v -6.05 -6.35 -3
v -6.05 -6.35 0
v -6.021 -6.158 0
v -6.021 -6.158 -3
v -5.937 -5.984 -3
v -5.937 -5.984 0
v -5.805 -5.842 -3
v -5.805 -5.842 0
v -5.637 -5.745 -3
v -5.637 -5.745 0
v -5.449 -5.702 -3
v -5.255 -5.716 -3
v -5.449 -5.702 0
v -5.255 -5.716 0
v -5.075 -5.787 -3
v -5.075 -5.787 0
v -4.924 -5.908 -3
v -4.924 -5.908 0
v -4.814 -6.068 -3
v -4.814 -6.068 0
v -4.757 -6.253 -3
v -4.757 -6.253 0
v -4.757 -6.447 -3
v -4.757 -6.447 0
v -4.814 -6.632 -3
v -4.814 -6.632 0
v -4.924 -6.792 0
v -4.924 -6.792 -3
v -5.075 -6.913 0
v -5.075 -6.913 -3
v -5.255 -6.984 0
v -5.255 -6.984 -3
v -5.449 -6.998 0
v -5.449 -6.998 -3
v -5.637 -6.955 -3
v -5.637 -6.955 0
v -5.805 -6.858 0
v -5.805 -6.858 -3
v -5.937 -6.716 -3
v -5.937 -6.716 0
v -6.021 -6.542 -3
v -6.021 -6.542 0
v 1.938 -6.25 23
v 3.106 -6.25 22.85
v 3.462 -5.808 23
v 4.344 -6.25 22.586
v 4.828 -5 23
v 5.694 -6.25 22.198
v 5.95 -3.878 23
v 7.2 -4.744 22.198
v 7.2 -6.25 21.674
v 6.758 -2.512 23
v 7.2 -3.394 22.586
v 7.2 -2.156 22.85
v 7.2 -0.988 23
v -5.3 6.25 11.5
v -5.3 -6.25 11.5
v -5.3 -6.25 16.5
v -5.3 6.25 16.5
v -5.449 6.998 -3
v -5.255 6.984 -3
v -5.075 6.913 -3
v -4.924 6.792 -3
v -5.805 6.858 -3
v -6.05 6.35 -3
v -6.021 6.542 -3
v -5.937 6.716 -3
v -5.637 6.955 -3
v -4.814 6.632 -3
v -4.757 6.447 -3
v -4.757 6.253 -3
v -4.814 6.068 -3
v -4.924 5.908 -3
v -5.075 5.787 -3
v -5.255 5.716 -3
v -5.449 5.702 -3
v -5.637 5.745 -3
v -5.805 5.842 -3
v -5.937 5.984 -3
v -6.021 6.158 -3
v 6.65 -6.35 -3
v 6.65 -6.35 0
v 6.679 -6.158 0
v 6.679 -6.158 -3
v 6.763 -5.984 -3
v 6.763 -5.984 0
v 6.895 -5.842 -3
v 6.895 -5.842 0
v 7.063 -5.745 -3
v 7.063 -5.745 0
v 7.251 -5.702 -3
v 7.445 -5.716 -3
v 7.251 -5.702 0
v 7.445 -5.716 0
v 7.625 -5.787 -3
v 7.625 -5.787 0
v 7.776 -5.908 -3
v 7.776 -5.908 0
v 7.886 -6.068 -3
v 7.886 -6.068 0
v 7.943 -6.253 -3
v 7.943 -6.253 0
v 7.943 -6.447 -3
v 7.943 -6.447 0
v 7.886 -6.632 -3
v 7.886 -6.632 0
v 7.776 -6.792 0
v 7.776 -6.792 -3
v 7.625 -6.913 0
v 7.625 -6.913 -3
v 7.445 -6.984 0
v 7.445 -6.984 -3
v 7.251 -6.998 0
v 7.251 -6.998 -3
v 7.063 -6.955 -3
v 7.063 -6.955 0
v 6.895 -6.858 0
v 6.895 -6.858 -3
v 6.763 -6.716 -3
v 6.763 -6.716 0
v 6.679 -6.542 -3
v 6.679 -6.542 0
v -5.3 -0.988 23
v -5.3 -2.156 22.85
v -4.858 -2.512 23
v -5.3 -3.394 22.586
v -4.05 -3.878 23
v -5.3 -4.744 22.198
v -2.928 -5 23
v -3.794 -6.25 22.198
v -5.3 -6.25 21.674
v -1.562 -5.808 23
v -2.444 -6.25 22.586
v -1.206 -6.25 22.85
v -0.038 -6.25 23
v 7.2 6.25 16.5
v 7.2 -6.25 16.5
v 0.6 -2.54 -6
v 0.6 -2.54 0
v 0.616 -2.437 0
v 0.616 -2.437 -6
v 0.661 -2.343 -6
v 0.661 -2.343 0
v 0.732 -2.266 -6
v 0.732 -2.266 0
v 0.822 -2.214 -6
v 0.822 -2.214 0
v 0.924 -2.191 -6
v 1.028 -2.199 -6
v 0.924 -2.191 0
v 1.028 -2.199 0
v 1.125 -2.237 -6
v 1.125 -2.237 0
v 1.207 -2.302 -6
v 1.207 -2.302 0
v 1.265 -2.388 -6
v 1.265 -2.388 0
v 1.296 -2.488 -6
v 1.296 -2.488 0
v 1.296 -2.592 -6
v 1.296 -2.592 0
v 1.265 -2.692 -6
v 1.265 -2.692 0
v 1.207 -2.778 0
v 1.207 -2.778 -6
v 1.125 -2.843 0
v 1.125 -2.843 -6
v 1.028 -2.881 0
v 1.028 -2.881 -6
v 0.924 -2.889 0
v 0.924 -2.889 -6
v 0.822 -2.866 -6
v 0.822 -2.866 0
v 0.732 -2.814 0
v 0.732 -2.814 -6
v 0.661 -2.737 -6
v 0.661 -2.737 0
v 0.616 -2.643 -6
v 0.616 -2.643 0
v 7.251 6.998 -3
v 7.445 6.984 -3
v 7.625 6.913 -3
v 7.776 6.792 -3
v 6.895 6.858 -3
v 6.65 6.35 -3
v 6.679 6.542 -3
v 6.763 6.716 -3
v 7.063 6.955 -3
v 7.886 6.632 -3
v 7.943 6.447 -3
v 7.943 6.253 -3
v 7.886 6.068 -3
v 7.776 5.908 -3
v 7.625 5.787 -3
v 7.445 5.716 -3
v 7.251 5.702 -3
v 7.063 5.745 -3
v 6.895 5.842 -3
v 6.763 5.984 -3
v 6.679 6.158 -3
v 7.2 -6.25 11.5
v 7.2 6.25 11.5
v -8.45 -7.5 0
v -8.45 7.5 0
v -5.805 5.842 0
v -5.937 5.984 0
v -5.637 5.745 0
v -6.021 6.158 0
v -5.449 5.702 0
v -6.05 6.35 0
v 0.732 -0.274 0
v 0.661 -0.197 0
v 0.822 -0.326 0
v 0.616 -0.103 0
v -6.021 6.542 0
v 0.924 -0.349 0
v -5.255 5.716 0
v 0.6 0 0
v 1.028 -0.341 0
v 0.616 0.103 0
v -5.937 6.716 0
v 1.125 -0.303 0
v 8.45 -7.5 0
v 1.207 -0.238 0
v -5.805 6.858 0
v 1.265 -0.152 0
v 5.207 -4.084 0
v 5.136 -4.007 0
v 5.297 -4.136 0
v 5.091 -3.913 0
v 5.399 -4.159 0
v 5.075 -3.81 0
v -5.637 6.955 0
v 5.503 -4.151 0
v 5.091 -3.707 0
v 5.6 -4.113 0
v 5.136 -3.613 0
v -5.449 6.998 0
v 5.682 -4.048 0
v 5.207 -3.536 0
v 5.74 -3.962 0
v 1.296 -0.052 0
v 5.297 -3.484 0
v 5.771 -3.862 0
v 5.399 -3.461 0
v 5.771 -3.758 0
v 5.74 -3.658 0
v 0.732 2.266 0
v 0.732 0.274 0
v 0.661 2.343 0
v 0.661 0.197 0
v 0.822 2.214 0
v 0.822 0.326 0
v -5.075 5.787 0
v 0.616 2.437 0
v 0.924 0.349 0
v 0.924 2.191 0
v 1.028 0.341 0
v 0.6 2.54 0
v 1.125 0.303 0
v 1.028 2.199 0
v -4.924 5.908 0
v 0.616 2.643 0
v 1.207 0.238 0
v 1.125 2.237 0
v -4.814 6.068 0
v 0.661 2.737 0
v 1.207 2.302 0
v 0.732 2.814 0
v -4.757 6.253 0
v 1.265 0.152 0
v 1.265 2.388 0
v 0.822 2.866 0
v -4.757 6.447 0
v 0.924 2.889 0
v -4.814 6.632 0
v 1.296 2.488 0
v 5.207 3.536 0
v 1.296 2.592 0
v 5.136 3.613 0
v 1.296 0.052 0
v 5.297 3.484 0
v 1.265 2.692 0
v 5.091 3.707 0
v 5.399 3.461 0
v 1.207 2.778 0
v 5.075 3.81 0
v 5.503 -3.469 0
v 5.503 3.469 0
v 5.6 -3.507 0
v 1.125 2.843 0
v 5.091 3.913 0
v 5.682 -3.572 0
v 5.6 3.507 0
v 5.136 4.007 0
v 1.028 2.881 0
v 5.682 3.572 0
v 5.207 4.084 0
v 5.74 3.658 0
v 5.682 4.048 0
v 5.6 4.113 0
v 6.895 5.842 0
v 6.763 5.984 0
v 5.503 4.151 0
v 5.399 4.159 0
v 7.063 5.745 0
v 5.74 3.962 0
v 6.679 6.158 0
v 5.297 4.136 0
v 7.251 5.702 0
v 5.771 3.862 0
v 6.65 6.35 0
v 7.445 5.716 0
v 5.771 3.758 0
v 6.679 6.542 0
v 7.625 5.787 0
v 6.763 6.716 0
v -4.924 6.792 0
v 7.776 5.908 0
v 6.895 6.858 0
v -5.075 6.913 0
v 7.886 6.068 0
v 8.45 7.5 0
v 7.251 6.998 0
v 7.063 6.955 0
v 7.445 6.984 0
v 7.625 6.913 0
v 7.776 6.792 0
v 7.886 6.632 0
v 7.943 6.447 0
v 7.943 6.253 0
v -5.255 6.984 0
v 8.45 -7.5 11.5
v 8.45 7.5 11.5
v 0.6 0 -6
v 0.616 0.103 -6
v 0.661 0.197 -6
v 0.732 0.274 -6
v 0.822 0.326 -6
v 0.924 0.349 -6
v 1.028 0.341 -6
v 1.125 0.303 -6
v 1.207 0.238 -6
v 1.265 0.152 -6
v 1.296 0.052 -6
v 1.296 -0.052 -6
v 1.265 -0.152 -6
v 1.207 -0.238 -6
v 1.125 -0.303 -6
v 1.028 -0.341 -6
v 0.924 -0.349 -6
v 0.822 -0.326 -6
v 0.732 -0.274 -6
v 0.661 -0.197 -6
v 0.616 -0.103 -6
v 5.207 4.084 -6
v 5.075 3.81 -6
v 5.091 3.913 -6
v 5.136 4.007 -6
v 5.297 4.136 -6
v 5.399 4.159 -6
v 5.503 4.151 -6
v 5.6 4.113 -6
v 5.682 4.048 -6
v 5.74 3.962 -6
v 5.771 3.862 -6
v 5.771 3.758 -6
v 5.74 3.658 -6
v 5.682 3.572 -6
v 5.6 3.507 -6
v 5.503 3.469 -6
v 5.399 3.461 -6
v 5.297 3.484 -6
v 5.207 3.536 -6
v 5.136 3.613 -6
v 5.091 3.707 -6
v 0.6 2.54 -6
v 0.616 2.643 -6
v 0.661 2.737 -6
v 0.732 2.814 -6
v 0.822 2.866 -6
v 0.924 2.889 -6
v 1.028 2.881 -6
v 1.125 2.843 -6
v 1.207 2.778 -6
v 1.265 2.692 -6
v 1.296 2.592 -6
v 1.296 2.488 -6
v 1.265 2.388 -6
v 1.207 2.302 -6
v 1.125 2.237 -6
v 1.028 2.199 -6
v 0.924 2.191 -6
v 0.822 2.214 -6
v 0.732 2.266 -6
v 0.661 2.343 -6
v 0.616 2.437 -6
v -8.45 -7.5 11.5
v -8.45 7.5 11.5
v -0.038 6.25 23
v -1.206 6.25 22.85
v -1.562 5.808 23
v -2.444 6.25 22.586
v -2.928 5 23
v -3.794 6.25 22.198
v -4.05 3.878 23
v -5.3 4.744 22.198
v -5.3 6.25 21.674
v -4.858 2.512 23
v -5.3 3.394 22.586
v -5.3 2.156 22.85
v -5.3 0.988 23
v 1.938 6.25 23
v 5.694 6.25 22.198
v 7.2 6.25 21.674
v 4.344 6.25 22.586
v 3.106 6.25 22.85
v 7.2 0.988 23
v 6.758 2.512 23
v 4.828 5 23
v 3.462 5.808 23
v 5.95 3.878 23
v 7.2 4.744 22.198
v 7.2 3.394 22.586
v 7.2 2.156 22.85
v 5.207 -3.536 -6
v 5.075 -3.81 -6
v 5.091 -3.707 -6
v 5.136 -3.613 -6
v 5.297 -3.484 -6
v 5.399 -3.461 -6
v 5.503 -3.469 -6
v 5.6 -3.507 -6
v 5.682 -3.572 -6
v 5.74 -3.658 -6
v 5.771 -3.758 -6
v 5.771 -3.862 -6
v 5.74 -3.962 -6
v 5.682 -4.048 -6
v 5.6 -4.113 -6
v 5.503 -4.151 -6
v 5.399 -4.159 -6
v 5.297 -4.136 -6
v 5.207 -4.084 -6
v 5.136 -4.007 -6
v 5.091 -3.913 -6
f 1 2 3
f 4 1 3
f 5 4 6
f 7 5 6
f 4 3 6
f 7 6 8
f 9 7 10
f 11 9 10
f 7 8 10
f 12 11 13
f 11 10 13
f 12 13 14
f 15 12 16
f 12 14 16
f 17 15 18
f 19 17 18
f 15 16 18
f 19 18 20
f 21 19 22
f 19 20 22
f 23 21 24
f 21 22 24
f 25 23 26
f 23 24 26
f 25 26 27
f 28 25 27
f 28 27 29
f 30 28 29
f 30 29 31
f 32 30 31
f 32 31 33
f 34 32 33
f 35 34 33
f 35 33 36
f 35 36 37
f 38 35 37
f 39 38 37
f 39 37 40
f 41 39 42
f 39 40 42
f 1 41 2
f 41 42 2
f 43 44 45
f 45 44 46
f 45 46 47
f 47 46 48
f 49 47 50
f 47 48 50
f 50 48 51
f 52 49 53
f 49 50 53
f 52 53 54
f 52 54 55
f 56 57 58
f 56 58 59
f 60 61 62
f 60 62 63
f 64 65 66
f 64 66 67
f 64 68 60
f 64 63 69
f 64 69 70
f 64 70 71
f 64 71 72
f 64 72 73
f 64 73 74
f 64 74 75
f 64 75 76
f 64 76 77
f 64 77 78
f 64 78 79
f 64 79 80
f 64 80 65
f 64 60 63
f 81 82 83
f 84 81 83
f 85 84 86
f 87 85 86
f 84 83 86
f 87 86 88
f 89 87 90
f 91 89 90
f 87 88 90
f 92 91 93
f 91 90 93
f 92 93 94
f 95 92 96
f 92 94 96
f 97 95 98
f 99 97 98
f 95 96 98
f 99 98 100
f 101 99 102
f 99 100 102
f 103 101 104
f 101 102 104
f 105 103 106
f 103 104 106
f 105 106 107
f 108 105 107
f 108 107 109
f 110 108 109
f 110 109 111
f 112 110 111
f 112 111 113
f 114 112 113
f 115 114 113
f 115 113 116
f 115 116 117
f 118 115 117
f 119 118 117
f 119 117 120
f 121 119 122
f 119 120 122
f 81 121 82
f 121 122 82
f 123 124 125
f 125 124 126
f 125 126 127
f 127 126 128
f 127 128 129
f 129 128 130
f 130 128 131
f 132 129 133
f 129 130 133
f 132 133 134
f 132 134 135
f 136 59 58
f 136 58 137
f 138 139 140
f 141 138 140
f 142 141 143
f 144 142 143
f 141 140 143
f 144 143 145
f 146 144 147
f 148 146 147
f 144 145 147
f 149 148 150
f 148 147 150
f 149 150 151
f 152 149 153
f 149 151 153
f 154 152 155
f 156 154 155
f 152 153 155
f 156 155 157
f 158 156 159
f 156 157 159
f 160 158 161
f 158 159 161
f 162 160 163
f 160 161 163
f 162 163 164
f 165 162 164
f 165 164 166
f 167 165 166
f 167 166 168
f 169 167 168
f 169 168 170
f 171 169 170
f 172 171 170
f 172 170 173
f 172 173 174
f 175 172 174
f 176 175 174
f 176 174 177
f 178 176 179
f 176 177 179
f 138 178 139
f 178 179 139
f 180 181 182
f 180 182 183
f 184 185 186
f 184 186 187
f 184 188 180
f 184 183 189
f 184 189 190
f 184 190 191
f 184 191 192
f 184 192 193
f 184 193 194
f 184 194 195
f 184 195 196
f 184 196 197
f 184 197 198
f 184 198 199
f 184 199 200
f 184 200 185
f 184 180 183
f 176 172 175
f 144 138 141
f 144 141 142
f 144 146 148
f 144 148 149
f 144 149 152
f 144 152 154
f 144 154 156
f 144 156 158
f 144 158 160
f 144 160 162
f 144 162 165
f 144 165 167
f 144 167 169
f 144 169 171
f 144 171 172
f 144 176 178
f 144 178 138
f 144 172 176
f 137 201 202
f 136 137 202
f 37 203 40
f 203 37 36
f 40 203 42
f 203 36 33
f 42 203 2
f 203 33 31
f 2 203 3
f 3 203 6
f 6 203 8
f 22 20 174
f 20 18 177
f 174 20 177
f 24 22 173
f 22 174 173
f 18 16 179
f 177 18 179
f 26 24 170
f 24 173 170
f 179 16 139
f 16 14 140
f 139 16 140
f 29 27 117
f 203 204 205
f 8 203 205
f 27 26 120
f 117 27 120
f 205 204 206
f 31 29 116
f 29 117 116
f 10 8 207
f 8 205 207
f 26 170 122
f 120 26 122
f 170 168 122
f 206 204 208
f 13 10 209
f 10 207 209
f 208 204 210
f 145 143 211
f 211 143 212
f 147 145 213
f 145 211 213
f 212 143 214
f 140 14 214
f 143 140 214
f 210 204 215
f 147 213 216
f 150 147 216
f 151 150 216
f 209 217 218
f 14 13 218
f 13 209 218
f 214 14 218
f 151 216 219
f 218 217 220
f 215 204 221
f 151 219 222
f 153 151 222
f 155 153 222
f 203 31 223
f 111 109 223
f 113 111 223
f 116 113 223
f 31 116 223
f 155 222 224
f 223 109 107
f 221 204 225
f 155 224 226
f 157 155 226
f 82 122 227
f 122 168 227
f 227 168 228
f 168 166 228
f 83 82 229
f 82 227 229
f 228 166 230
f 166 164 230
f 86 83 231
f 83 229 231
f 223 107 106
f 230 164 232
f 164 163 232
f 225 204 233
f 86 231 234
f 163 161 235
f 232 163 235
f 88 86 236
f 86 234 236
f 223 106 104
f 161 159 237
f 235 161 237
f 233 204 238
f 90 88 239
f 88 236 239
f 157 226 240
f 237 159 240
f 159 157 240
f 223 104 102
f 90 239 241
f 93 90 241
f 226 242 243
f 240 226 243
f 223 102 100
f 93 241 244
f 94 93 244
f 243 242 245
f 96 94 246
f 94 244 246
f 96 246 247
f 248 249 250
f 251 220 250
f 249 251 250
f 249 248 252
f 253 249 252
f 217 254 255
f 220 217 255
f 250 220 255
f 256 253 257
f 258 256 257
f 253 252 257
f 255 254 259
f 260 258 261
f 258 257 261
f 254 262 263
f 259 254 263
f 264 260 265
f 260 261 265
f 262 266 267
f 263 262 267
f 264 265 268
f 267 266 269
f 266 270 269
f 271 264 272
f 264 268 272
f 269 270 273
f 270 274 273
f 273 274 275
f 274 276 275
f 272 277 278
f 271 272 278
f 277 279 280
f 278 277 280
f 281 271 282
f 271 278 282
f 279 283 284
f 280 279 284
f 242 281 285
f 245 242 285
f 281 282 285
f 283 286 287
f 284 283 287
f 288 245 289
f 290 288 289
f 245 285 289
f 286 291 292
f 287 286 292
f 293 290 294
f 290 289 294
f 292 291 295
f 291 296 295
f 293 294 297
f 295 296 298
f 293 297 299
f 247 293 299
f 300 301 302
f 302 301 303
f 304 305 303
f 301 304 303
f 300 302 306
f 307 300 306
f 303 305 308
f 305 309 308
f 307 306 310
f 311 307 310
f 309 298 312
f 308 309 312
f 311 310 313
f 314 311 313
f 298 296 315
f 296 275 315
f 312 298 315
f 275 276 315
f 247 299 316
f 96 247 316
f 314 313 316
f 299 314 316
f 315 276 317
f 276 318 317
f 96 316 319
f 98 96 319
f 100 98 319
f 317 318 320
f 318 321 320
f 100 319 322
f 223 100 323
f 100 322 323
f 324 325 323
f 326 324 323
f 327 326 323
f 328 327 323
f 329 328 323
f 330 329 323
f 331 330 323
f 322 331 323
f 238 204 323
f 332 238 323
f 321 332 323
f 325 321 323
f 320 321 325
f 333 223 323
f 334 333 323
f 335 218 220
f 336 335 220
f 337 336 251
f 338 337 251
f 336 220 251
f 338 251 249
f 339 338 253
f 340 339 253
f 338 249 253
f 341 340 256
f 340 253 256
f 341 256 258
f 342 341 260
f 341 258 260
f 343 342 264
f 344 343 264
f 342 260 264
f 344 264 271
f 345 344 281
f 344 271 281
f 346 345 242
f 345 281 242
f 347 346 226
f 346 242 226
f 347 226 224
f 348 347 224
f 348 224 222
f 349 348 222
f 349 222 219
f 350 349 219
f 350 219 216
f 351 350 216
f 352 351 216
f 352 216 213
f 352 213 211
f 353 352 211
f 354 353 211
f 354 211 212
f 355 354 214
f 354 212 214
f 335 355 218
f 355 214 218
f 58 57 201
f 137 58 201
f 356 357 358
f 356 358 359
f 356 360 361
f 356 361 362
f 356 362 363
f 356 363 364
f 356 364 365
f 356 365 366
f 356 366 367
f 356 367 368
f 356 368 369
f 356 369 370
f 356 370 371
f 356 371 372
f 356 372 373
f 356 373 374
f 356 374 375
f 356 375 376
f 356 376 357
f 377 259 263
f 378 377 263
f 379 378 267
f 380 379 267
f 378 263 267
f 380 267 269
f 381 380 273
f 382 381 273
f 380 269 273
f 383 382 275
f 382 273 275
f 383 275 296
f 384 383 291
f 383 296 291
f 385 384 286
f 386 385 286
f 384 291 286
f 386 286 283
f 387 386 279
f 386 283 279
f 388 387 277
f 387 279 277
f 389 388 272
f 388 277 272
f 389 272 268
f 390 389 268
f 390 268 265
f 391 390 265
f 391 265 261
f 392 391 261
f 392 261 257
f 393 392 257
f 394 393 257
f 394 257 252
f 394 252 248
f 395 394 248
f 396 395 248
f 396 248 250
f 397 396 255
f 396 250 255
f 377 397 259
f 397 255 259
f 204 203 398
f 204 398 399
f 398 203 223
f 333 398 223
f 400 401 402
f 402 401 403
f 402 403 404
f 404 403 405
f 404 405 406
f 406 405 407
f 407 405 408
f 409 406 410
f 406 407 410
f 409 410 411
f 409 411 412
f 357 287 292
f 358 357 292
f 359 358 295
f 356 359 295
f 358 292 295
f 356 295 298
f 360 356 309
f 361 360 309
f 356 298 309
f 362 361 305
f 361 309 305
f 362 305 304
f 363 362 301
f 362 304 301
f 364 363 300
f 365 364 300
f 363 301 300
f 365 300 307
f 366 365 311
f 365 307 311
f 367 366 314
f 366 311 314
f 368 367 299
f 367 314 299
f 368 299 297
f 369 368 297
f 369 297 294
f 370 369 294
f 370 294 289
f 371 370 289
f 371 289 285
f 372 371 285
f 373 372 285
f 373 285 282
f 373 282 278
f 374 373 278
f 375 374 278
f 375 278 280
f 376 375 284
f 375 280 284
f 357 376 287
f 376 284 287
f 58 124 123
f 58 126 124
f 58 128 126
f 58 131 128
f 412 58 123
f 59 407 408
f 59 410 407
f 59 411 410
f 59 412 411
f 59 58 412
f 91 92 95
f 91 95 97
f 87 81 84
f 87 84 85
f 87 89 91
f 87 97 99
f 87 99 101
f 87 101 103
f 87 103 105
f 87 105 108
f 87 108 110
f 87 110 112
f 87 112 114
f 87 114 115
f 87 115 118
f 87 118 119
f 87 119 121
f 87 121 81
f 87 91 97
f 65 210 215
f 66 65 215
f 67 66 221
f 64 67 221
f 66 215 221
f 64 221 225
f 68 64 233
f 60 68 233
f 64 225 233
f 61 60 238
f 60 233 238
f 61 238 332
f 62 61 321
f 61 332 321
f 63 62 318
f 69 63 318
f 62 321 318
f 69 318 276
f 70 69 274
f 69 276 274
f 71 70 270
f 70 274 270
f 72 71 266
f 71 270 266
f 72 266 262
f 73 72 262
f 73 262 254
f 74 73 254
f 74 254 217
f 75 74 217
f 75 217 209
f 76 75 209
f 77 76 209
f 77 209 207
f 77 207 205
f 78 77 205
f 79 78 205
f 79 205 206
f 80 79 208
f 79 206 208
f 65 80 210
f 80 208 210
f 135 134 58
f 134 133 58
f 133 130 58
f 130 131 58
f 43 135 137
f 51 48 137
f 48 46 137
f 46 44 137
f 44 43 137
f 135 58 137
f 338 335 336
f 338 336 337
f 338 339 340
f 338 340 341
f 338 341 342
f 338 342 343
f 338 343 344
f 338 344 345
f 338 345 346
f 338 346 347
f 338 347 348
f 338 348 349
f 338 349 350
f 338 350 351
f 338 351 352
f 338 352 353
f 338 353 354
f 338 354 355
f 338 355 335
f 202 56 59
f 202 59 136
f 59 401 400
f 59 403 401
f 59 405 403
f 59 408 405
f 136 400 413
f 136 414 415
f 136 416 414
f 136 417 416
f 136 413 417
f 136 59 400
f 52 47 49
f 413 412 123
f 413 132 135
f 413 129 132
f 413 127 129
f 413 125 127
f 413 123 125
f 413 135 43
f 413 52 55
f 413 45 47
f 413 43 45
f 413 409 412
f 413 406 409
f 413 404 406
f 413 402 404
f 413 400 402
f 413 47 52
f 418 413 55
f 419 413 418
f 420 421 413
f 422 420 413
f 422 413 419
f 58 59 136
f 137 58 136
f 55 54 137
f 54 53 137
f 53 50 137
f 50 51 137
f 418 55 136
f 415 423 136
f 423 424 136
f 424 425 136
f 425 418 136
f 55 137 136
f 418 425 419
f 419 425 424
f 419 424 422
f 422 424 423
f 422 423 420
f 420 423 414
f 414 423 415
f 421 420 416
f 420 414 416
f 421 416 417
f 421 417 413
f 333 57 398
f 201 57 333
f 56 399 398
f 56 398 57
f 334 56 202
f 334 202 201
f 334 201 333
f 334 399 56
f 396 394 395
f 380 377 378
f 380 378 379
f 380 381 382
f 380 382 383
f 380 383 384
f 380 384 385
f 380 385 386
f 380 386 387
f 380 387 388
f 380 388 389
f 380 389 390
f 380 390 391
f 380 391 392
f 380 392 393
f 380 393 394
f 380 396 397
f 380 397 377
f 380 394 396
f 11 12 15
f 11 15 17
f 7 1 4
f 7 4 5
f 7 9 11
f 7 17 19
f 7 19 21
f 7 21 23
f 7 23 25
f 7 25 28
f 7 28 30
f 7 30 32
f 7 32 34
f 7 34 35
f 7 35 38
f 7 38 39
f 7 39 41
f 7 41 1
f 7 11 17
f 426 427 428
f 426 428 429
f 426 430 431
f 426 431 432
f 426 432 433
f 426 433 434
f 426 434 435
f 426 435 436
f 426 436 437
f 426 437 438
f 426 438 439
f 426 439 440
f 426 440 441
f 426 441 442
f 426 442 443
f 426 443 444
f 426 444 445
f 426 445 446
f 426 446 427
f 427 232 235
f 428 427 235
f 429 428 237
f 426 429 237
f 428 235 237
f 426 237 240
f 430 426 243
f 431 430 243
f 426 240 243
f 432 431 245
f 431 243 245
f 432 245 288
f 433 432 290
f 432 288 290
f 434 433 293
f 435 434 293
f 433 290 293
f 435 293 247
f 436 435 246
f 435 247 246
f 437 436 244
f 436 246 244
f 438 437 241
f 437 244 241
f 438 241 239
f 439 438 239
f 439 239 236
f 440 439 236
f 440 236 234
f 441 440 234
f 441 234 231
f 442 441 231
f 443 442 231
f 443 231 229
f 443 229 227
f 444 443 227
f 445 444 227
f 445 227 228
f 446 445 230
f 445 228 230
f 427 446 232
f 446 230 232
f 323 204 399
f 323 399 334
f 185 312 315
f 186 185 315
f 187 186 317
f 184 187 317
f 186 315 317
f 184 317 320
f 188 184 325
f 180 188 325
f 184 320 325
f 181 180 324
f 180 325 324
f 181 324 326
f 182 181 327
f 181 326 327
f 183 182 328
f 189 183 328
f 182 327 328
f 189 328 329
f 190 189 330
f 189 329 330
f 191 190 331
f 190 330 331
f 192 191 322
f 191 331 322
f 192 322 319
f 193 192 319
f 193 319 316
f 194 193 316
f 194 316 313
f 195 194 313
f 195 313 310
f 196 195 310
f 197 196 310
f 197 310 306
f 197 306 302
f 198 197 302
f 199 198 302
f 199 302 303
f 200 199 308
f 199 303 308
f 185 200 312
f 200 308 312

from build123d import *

# Parameters (mm, degrees)
SKETCH1_W           = 16.9
SKETCH1_H           = 15
BOSS_EXTRUDE1_DEPTH = 11.5
SKETCH3_R           = 0.65
BOSS_EXTRUDE2_DEPTH = 3
SKETCH3_3_R         = 0.35
BOSS_EXTRUDE3_DEPTH = 6
SKETCH6_W           = 12.5
SKETCH6_H           = 12.5
BOSS_EXTRUDE4_DEPTH = 5
SKETCH7_W           = 12.5
SKETCH7_H           = 12.5
BOSS_EXTRUDE5_DEPTH = 6.5


with BuildPart() as part:
    # Sketch1 → Boss-Extrude1 (new body)
    with BuildSketch(Plane.XY):
        Rectangle(SKETCH1_W, SKETCH1_H)
    extrude(amount=BOSS_EXTRUDE1_DEPTH)

    # Sketch3 → Boss-Extrude2 (add)
    with BuildSketch(Plane(origin=(0, 0, 0), x_dir=(-1, 0, 0), z_dir=(0, 0, -1))):
        with Locations((5.4, 6.35)):
            Circle(SKETCH3_R)
        with Locations((5.4, -6.35)):
            Circle(SKETCH3_R)
        with Locations((-7.3, -6.35)):
            Circle(SKETCH3_R)
        with Locations((-7.3, 6.35)):
            Circle(SKETCH3_R)
    extrude(amount=BOSS_EXTRUDE2_DEPTH)

    # Sketch3<3> → Boss-Extrude3 (add)
    with BuildSketch(Plane(origin=(0, 0, 0), x_dir=(-1, 0, 0), z_dir=(0, 0, -1))):
        with Locations((-5.425, 3.81)):
            Circle(SKETCH3_3_R)
        with Locations((-0.95, 2.54)):
            Circle(SKETCH3_3_R)
        with Locations((-0.95, -2.54)):
            Circle(SKETCH3_3_R)
        with Locations((-5.425, -3.81)):
            Circle(SKETCH3_3_R)
        with Locations((-0.95, 0)):
            Circle(SKETCH3_3_R)
    extrude(amount=BOSS_EXTRUDE3_DEPTH)

    # Sketch6 → Boss-Extrude4 (add)
    with BuildSketch(Plane.XY.offset(11.5)):
        with Locations((0.95, 0)):
            Rectangle(SKETCH6_W, SKETCH6_H)
    extrude(amount=BOSS_EXTRUDE4_DEPTH)


with BuildPart() as body_2:
    # Sketch7 → Boss-Extrude5 (new body)
    with BuildSketch(Plane.XY.offset(16.5)):
        with Locations((0.95, 0)):
            Rectangle(SKETCH7_W, SKETCH7_H)
    extrude(amount=BOSS_EXTRUDE5_DEPTH)

    # Sketch9 → Cut-Revolve1 (revolve, cut)
    with BuildSketch(Plane(origin=(0, 0, 0), x_dir=(1, 0, 0), z_dir=(0, 1, 0))):
        Polygon((-5.353275031, -23.012867052), (-10.018917376, -20.548337131), (-10.618952059, -23.756705478), align=None)
    revolve(axis=Axis((0.95, 0, 16.175), (0, 0, 1)), mode=Mode.SUBTRACT)


solid = Compound([part.part, body_2.part])
